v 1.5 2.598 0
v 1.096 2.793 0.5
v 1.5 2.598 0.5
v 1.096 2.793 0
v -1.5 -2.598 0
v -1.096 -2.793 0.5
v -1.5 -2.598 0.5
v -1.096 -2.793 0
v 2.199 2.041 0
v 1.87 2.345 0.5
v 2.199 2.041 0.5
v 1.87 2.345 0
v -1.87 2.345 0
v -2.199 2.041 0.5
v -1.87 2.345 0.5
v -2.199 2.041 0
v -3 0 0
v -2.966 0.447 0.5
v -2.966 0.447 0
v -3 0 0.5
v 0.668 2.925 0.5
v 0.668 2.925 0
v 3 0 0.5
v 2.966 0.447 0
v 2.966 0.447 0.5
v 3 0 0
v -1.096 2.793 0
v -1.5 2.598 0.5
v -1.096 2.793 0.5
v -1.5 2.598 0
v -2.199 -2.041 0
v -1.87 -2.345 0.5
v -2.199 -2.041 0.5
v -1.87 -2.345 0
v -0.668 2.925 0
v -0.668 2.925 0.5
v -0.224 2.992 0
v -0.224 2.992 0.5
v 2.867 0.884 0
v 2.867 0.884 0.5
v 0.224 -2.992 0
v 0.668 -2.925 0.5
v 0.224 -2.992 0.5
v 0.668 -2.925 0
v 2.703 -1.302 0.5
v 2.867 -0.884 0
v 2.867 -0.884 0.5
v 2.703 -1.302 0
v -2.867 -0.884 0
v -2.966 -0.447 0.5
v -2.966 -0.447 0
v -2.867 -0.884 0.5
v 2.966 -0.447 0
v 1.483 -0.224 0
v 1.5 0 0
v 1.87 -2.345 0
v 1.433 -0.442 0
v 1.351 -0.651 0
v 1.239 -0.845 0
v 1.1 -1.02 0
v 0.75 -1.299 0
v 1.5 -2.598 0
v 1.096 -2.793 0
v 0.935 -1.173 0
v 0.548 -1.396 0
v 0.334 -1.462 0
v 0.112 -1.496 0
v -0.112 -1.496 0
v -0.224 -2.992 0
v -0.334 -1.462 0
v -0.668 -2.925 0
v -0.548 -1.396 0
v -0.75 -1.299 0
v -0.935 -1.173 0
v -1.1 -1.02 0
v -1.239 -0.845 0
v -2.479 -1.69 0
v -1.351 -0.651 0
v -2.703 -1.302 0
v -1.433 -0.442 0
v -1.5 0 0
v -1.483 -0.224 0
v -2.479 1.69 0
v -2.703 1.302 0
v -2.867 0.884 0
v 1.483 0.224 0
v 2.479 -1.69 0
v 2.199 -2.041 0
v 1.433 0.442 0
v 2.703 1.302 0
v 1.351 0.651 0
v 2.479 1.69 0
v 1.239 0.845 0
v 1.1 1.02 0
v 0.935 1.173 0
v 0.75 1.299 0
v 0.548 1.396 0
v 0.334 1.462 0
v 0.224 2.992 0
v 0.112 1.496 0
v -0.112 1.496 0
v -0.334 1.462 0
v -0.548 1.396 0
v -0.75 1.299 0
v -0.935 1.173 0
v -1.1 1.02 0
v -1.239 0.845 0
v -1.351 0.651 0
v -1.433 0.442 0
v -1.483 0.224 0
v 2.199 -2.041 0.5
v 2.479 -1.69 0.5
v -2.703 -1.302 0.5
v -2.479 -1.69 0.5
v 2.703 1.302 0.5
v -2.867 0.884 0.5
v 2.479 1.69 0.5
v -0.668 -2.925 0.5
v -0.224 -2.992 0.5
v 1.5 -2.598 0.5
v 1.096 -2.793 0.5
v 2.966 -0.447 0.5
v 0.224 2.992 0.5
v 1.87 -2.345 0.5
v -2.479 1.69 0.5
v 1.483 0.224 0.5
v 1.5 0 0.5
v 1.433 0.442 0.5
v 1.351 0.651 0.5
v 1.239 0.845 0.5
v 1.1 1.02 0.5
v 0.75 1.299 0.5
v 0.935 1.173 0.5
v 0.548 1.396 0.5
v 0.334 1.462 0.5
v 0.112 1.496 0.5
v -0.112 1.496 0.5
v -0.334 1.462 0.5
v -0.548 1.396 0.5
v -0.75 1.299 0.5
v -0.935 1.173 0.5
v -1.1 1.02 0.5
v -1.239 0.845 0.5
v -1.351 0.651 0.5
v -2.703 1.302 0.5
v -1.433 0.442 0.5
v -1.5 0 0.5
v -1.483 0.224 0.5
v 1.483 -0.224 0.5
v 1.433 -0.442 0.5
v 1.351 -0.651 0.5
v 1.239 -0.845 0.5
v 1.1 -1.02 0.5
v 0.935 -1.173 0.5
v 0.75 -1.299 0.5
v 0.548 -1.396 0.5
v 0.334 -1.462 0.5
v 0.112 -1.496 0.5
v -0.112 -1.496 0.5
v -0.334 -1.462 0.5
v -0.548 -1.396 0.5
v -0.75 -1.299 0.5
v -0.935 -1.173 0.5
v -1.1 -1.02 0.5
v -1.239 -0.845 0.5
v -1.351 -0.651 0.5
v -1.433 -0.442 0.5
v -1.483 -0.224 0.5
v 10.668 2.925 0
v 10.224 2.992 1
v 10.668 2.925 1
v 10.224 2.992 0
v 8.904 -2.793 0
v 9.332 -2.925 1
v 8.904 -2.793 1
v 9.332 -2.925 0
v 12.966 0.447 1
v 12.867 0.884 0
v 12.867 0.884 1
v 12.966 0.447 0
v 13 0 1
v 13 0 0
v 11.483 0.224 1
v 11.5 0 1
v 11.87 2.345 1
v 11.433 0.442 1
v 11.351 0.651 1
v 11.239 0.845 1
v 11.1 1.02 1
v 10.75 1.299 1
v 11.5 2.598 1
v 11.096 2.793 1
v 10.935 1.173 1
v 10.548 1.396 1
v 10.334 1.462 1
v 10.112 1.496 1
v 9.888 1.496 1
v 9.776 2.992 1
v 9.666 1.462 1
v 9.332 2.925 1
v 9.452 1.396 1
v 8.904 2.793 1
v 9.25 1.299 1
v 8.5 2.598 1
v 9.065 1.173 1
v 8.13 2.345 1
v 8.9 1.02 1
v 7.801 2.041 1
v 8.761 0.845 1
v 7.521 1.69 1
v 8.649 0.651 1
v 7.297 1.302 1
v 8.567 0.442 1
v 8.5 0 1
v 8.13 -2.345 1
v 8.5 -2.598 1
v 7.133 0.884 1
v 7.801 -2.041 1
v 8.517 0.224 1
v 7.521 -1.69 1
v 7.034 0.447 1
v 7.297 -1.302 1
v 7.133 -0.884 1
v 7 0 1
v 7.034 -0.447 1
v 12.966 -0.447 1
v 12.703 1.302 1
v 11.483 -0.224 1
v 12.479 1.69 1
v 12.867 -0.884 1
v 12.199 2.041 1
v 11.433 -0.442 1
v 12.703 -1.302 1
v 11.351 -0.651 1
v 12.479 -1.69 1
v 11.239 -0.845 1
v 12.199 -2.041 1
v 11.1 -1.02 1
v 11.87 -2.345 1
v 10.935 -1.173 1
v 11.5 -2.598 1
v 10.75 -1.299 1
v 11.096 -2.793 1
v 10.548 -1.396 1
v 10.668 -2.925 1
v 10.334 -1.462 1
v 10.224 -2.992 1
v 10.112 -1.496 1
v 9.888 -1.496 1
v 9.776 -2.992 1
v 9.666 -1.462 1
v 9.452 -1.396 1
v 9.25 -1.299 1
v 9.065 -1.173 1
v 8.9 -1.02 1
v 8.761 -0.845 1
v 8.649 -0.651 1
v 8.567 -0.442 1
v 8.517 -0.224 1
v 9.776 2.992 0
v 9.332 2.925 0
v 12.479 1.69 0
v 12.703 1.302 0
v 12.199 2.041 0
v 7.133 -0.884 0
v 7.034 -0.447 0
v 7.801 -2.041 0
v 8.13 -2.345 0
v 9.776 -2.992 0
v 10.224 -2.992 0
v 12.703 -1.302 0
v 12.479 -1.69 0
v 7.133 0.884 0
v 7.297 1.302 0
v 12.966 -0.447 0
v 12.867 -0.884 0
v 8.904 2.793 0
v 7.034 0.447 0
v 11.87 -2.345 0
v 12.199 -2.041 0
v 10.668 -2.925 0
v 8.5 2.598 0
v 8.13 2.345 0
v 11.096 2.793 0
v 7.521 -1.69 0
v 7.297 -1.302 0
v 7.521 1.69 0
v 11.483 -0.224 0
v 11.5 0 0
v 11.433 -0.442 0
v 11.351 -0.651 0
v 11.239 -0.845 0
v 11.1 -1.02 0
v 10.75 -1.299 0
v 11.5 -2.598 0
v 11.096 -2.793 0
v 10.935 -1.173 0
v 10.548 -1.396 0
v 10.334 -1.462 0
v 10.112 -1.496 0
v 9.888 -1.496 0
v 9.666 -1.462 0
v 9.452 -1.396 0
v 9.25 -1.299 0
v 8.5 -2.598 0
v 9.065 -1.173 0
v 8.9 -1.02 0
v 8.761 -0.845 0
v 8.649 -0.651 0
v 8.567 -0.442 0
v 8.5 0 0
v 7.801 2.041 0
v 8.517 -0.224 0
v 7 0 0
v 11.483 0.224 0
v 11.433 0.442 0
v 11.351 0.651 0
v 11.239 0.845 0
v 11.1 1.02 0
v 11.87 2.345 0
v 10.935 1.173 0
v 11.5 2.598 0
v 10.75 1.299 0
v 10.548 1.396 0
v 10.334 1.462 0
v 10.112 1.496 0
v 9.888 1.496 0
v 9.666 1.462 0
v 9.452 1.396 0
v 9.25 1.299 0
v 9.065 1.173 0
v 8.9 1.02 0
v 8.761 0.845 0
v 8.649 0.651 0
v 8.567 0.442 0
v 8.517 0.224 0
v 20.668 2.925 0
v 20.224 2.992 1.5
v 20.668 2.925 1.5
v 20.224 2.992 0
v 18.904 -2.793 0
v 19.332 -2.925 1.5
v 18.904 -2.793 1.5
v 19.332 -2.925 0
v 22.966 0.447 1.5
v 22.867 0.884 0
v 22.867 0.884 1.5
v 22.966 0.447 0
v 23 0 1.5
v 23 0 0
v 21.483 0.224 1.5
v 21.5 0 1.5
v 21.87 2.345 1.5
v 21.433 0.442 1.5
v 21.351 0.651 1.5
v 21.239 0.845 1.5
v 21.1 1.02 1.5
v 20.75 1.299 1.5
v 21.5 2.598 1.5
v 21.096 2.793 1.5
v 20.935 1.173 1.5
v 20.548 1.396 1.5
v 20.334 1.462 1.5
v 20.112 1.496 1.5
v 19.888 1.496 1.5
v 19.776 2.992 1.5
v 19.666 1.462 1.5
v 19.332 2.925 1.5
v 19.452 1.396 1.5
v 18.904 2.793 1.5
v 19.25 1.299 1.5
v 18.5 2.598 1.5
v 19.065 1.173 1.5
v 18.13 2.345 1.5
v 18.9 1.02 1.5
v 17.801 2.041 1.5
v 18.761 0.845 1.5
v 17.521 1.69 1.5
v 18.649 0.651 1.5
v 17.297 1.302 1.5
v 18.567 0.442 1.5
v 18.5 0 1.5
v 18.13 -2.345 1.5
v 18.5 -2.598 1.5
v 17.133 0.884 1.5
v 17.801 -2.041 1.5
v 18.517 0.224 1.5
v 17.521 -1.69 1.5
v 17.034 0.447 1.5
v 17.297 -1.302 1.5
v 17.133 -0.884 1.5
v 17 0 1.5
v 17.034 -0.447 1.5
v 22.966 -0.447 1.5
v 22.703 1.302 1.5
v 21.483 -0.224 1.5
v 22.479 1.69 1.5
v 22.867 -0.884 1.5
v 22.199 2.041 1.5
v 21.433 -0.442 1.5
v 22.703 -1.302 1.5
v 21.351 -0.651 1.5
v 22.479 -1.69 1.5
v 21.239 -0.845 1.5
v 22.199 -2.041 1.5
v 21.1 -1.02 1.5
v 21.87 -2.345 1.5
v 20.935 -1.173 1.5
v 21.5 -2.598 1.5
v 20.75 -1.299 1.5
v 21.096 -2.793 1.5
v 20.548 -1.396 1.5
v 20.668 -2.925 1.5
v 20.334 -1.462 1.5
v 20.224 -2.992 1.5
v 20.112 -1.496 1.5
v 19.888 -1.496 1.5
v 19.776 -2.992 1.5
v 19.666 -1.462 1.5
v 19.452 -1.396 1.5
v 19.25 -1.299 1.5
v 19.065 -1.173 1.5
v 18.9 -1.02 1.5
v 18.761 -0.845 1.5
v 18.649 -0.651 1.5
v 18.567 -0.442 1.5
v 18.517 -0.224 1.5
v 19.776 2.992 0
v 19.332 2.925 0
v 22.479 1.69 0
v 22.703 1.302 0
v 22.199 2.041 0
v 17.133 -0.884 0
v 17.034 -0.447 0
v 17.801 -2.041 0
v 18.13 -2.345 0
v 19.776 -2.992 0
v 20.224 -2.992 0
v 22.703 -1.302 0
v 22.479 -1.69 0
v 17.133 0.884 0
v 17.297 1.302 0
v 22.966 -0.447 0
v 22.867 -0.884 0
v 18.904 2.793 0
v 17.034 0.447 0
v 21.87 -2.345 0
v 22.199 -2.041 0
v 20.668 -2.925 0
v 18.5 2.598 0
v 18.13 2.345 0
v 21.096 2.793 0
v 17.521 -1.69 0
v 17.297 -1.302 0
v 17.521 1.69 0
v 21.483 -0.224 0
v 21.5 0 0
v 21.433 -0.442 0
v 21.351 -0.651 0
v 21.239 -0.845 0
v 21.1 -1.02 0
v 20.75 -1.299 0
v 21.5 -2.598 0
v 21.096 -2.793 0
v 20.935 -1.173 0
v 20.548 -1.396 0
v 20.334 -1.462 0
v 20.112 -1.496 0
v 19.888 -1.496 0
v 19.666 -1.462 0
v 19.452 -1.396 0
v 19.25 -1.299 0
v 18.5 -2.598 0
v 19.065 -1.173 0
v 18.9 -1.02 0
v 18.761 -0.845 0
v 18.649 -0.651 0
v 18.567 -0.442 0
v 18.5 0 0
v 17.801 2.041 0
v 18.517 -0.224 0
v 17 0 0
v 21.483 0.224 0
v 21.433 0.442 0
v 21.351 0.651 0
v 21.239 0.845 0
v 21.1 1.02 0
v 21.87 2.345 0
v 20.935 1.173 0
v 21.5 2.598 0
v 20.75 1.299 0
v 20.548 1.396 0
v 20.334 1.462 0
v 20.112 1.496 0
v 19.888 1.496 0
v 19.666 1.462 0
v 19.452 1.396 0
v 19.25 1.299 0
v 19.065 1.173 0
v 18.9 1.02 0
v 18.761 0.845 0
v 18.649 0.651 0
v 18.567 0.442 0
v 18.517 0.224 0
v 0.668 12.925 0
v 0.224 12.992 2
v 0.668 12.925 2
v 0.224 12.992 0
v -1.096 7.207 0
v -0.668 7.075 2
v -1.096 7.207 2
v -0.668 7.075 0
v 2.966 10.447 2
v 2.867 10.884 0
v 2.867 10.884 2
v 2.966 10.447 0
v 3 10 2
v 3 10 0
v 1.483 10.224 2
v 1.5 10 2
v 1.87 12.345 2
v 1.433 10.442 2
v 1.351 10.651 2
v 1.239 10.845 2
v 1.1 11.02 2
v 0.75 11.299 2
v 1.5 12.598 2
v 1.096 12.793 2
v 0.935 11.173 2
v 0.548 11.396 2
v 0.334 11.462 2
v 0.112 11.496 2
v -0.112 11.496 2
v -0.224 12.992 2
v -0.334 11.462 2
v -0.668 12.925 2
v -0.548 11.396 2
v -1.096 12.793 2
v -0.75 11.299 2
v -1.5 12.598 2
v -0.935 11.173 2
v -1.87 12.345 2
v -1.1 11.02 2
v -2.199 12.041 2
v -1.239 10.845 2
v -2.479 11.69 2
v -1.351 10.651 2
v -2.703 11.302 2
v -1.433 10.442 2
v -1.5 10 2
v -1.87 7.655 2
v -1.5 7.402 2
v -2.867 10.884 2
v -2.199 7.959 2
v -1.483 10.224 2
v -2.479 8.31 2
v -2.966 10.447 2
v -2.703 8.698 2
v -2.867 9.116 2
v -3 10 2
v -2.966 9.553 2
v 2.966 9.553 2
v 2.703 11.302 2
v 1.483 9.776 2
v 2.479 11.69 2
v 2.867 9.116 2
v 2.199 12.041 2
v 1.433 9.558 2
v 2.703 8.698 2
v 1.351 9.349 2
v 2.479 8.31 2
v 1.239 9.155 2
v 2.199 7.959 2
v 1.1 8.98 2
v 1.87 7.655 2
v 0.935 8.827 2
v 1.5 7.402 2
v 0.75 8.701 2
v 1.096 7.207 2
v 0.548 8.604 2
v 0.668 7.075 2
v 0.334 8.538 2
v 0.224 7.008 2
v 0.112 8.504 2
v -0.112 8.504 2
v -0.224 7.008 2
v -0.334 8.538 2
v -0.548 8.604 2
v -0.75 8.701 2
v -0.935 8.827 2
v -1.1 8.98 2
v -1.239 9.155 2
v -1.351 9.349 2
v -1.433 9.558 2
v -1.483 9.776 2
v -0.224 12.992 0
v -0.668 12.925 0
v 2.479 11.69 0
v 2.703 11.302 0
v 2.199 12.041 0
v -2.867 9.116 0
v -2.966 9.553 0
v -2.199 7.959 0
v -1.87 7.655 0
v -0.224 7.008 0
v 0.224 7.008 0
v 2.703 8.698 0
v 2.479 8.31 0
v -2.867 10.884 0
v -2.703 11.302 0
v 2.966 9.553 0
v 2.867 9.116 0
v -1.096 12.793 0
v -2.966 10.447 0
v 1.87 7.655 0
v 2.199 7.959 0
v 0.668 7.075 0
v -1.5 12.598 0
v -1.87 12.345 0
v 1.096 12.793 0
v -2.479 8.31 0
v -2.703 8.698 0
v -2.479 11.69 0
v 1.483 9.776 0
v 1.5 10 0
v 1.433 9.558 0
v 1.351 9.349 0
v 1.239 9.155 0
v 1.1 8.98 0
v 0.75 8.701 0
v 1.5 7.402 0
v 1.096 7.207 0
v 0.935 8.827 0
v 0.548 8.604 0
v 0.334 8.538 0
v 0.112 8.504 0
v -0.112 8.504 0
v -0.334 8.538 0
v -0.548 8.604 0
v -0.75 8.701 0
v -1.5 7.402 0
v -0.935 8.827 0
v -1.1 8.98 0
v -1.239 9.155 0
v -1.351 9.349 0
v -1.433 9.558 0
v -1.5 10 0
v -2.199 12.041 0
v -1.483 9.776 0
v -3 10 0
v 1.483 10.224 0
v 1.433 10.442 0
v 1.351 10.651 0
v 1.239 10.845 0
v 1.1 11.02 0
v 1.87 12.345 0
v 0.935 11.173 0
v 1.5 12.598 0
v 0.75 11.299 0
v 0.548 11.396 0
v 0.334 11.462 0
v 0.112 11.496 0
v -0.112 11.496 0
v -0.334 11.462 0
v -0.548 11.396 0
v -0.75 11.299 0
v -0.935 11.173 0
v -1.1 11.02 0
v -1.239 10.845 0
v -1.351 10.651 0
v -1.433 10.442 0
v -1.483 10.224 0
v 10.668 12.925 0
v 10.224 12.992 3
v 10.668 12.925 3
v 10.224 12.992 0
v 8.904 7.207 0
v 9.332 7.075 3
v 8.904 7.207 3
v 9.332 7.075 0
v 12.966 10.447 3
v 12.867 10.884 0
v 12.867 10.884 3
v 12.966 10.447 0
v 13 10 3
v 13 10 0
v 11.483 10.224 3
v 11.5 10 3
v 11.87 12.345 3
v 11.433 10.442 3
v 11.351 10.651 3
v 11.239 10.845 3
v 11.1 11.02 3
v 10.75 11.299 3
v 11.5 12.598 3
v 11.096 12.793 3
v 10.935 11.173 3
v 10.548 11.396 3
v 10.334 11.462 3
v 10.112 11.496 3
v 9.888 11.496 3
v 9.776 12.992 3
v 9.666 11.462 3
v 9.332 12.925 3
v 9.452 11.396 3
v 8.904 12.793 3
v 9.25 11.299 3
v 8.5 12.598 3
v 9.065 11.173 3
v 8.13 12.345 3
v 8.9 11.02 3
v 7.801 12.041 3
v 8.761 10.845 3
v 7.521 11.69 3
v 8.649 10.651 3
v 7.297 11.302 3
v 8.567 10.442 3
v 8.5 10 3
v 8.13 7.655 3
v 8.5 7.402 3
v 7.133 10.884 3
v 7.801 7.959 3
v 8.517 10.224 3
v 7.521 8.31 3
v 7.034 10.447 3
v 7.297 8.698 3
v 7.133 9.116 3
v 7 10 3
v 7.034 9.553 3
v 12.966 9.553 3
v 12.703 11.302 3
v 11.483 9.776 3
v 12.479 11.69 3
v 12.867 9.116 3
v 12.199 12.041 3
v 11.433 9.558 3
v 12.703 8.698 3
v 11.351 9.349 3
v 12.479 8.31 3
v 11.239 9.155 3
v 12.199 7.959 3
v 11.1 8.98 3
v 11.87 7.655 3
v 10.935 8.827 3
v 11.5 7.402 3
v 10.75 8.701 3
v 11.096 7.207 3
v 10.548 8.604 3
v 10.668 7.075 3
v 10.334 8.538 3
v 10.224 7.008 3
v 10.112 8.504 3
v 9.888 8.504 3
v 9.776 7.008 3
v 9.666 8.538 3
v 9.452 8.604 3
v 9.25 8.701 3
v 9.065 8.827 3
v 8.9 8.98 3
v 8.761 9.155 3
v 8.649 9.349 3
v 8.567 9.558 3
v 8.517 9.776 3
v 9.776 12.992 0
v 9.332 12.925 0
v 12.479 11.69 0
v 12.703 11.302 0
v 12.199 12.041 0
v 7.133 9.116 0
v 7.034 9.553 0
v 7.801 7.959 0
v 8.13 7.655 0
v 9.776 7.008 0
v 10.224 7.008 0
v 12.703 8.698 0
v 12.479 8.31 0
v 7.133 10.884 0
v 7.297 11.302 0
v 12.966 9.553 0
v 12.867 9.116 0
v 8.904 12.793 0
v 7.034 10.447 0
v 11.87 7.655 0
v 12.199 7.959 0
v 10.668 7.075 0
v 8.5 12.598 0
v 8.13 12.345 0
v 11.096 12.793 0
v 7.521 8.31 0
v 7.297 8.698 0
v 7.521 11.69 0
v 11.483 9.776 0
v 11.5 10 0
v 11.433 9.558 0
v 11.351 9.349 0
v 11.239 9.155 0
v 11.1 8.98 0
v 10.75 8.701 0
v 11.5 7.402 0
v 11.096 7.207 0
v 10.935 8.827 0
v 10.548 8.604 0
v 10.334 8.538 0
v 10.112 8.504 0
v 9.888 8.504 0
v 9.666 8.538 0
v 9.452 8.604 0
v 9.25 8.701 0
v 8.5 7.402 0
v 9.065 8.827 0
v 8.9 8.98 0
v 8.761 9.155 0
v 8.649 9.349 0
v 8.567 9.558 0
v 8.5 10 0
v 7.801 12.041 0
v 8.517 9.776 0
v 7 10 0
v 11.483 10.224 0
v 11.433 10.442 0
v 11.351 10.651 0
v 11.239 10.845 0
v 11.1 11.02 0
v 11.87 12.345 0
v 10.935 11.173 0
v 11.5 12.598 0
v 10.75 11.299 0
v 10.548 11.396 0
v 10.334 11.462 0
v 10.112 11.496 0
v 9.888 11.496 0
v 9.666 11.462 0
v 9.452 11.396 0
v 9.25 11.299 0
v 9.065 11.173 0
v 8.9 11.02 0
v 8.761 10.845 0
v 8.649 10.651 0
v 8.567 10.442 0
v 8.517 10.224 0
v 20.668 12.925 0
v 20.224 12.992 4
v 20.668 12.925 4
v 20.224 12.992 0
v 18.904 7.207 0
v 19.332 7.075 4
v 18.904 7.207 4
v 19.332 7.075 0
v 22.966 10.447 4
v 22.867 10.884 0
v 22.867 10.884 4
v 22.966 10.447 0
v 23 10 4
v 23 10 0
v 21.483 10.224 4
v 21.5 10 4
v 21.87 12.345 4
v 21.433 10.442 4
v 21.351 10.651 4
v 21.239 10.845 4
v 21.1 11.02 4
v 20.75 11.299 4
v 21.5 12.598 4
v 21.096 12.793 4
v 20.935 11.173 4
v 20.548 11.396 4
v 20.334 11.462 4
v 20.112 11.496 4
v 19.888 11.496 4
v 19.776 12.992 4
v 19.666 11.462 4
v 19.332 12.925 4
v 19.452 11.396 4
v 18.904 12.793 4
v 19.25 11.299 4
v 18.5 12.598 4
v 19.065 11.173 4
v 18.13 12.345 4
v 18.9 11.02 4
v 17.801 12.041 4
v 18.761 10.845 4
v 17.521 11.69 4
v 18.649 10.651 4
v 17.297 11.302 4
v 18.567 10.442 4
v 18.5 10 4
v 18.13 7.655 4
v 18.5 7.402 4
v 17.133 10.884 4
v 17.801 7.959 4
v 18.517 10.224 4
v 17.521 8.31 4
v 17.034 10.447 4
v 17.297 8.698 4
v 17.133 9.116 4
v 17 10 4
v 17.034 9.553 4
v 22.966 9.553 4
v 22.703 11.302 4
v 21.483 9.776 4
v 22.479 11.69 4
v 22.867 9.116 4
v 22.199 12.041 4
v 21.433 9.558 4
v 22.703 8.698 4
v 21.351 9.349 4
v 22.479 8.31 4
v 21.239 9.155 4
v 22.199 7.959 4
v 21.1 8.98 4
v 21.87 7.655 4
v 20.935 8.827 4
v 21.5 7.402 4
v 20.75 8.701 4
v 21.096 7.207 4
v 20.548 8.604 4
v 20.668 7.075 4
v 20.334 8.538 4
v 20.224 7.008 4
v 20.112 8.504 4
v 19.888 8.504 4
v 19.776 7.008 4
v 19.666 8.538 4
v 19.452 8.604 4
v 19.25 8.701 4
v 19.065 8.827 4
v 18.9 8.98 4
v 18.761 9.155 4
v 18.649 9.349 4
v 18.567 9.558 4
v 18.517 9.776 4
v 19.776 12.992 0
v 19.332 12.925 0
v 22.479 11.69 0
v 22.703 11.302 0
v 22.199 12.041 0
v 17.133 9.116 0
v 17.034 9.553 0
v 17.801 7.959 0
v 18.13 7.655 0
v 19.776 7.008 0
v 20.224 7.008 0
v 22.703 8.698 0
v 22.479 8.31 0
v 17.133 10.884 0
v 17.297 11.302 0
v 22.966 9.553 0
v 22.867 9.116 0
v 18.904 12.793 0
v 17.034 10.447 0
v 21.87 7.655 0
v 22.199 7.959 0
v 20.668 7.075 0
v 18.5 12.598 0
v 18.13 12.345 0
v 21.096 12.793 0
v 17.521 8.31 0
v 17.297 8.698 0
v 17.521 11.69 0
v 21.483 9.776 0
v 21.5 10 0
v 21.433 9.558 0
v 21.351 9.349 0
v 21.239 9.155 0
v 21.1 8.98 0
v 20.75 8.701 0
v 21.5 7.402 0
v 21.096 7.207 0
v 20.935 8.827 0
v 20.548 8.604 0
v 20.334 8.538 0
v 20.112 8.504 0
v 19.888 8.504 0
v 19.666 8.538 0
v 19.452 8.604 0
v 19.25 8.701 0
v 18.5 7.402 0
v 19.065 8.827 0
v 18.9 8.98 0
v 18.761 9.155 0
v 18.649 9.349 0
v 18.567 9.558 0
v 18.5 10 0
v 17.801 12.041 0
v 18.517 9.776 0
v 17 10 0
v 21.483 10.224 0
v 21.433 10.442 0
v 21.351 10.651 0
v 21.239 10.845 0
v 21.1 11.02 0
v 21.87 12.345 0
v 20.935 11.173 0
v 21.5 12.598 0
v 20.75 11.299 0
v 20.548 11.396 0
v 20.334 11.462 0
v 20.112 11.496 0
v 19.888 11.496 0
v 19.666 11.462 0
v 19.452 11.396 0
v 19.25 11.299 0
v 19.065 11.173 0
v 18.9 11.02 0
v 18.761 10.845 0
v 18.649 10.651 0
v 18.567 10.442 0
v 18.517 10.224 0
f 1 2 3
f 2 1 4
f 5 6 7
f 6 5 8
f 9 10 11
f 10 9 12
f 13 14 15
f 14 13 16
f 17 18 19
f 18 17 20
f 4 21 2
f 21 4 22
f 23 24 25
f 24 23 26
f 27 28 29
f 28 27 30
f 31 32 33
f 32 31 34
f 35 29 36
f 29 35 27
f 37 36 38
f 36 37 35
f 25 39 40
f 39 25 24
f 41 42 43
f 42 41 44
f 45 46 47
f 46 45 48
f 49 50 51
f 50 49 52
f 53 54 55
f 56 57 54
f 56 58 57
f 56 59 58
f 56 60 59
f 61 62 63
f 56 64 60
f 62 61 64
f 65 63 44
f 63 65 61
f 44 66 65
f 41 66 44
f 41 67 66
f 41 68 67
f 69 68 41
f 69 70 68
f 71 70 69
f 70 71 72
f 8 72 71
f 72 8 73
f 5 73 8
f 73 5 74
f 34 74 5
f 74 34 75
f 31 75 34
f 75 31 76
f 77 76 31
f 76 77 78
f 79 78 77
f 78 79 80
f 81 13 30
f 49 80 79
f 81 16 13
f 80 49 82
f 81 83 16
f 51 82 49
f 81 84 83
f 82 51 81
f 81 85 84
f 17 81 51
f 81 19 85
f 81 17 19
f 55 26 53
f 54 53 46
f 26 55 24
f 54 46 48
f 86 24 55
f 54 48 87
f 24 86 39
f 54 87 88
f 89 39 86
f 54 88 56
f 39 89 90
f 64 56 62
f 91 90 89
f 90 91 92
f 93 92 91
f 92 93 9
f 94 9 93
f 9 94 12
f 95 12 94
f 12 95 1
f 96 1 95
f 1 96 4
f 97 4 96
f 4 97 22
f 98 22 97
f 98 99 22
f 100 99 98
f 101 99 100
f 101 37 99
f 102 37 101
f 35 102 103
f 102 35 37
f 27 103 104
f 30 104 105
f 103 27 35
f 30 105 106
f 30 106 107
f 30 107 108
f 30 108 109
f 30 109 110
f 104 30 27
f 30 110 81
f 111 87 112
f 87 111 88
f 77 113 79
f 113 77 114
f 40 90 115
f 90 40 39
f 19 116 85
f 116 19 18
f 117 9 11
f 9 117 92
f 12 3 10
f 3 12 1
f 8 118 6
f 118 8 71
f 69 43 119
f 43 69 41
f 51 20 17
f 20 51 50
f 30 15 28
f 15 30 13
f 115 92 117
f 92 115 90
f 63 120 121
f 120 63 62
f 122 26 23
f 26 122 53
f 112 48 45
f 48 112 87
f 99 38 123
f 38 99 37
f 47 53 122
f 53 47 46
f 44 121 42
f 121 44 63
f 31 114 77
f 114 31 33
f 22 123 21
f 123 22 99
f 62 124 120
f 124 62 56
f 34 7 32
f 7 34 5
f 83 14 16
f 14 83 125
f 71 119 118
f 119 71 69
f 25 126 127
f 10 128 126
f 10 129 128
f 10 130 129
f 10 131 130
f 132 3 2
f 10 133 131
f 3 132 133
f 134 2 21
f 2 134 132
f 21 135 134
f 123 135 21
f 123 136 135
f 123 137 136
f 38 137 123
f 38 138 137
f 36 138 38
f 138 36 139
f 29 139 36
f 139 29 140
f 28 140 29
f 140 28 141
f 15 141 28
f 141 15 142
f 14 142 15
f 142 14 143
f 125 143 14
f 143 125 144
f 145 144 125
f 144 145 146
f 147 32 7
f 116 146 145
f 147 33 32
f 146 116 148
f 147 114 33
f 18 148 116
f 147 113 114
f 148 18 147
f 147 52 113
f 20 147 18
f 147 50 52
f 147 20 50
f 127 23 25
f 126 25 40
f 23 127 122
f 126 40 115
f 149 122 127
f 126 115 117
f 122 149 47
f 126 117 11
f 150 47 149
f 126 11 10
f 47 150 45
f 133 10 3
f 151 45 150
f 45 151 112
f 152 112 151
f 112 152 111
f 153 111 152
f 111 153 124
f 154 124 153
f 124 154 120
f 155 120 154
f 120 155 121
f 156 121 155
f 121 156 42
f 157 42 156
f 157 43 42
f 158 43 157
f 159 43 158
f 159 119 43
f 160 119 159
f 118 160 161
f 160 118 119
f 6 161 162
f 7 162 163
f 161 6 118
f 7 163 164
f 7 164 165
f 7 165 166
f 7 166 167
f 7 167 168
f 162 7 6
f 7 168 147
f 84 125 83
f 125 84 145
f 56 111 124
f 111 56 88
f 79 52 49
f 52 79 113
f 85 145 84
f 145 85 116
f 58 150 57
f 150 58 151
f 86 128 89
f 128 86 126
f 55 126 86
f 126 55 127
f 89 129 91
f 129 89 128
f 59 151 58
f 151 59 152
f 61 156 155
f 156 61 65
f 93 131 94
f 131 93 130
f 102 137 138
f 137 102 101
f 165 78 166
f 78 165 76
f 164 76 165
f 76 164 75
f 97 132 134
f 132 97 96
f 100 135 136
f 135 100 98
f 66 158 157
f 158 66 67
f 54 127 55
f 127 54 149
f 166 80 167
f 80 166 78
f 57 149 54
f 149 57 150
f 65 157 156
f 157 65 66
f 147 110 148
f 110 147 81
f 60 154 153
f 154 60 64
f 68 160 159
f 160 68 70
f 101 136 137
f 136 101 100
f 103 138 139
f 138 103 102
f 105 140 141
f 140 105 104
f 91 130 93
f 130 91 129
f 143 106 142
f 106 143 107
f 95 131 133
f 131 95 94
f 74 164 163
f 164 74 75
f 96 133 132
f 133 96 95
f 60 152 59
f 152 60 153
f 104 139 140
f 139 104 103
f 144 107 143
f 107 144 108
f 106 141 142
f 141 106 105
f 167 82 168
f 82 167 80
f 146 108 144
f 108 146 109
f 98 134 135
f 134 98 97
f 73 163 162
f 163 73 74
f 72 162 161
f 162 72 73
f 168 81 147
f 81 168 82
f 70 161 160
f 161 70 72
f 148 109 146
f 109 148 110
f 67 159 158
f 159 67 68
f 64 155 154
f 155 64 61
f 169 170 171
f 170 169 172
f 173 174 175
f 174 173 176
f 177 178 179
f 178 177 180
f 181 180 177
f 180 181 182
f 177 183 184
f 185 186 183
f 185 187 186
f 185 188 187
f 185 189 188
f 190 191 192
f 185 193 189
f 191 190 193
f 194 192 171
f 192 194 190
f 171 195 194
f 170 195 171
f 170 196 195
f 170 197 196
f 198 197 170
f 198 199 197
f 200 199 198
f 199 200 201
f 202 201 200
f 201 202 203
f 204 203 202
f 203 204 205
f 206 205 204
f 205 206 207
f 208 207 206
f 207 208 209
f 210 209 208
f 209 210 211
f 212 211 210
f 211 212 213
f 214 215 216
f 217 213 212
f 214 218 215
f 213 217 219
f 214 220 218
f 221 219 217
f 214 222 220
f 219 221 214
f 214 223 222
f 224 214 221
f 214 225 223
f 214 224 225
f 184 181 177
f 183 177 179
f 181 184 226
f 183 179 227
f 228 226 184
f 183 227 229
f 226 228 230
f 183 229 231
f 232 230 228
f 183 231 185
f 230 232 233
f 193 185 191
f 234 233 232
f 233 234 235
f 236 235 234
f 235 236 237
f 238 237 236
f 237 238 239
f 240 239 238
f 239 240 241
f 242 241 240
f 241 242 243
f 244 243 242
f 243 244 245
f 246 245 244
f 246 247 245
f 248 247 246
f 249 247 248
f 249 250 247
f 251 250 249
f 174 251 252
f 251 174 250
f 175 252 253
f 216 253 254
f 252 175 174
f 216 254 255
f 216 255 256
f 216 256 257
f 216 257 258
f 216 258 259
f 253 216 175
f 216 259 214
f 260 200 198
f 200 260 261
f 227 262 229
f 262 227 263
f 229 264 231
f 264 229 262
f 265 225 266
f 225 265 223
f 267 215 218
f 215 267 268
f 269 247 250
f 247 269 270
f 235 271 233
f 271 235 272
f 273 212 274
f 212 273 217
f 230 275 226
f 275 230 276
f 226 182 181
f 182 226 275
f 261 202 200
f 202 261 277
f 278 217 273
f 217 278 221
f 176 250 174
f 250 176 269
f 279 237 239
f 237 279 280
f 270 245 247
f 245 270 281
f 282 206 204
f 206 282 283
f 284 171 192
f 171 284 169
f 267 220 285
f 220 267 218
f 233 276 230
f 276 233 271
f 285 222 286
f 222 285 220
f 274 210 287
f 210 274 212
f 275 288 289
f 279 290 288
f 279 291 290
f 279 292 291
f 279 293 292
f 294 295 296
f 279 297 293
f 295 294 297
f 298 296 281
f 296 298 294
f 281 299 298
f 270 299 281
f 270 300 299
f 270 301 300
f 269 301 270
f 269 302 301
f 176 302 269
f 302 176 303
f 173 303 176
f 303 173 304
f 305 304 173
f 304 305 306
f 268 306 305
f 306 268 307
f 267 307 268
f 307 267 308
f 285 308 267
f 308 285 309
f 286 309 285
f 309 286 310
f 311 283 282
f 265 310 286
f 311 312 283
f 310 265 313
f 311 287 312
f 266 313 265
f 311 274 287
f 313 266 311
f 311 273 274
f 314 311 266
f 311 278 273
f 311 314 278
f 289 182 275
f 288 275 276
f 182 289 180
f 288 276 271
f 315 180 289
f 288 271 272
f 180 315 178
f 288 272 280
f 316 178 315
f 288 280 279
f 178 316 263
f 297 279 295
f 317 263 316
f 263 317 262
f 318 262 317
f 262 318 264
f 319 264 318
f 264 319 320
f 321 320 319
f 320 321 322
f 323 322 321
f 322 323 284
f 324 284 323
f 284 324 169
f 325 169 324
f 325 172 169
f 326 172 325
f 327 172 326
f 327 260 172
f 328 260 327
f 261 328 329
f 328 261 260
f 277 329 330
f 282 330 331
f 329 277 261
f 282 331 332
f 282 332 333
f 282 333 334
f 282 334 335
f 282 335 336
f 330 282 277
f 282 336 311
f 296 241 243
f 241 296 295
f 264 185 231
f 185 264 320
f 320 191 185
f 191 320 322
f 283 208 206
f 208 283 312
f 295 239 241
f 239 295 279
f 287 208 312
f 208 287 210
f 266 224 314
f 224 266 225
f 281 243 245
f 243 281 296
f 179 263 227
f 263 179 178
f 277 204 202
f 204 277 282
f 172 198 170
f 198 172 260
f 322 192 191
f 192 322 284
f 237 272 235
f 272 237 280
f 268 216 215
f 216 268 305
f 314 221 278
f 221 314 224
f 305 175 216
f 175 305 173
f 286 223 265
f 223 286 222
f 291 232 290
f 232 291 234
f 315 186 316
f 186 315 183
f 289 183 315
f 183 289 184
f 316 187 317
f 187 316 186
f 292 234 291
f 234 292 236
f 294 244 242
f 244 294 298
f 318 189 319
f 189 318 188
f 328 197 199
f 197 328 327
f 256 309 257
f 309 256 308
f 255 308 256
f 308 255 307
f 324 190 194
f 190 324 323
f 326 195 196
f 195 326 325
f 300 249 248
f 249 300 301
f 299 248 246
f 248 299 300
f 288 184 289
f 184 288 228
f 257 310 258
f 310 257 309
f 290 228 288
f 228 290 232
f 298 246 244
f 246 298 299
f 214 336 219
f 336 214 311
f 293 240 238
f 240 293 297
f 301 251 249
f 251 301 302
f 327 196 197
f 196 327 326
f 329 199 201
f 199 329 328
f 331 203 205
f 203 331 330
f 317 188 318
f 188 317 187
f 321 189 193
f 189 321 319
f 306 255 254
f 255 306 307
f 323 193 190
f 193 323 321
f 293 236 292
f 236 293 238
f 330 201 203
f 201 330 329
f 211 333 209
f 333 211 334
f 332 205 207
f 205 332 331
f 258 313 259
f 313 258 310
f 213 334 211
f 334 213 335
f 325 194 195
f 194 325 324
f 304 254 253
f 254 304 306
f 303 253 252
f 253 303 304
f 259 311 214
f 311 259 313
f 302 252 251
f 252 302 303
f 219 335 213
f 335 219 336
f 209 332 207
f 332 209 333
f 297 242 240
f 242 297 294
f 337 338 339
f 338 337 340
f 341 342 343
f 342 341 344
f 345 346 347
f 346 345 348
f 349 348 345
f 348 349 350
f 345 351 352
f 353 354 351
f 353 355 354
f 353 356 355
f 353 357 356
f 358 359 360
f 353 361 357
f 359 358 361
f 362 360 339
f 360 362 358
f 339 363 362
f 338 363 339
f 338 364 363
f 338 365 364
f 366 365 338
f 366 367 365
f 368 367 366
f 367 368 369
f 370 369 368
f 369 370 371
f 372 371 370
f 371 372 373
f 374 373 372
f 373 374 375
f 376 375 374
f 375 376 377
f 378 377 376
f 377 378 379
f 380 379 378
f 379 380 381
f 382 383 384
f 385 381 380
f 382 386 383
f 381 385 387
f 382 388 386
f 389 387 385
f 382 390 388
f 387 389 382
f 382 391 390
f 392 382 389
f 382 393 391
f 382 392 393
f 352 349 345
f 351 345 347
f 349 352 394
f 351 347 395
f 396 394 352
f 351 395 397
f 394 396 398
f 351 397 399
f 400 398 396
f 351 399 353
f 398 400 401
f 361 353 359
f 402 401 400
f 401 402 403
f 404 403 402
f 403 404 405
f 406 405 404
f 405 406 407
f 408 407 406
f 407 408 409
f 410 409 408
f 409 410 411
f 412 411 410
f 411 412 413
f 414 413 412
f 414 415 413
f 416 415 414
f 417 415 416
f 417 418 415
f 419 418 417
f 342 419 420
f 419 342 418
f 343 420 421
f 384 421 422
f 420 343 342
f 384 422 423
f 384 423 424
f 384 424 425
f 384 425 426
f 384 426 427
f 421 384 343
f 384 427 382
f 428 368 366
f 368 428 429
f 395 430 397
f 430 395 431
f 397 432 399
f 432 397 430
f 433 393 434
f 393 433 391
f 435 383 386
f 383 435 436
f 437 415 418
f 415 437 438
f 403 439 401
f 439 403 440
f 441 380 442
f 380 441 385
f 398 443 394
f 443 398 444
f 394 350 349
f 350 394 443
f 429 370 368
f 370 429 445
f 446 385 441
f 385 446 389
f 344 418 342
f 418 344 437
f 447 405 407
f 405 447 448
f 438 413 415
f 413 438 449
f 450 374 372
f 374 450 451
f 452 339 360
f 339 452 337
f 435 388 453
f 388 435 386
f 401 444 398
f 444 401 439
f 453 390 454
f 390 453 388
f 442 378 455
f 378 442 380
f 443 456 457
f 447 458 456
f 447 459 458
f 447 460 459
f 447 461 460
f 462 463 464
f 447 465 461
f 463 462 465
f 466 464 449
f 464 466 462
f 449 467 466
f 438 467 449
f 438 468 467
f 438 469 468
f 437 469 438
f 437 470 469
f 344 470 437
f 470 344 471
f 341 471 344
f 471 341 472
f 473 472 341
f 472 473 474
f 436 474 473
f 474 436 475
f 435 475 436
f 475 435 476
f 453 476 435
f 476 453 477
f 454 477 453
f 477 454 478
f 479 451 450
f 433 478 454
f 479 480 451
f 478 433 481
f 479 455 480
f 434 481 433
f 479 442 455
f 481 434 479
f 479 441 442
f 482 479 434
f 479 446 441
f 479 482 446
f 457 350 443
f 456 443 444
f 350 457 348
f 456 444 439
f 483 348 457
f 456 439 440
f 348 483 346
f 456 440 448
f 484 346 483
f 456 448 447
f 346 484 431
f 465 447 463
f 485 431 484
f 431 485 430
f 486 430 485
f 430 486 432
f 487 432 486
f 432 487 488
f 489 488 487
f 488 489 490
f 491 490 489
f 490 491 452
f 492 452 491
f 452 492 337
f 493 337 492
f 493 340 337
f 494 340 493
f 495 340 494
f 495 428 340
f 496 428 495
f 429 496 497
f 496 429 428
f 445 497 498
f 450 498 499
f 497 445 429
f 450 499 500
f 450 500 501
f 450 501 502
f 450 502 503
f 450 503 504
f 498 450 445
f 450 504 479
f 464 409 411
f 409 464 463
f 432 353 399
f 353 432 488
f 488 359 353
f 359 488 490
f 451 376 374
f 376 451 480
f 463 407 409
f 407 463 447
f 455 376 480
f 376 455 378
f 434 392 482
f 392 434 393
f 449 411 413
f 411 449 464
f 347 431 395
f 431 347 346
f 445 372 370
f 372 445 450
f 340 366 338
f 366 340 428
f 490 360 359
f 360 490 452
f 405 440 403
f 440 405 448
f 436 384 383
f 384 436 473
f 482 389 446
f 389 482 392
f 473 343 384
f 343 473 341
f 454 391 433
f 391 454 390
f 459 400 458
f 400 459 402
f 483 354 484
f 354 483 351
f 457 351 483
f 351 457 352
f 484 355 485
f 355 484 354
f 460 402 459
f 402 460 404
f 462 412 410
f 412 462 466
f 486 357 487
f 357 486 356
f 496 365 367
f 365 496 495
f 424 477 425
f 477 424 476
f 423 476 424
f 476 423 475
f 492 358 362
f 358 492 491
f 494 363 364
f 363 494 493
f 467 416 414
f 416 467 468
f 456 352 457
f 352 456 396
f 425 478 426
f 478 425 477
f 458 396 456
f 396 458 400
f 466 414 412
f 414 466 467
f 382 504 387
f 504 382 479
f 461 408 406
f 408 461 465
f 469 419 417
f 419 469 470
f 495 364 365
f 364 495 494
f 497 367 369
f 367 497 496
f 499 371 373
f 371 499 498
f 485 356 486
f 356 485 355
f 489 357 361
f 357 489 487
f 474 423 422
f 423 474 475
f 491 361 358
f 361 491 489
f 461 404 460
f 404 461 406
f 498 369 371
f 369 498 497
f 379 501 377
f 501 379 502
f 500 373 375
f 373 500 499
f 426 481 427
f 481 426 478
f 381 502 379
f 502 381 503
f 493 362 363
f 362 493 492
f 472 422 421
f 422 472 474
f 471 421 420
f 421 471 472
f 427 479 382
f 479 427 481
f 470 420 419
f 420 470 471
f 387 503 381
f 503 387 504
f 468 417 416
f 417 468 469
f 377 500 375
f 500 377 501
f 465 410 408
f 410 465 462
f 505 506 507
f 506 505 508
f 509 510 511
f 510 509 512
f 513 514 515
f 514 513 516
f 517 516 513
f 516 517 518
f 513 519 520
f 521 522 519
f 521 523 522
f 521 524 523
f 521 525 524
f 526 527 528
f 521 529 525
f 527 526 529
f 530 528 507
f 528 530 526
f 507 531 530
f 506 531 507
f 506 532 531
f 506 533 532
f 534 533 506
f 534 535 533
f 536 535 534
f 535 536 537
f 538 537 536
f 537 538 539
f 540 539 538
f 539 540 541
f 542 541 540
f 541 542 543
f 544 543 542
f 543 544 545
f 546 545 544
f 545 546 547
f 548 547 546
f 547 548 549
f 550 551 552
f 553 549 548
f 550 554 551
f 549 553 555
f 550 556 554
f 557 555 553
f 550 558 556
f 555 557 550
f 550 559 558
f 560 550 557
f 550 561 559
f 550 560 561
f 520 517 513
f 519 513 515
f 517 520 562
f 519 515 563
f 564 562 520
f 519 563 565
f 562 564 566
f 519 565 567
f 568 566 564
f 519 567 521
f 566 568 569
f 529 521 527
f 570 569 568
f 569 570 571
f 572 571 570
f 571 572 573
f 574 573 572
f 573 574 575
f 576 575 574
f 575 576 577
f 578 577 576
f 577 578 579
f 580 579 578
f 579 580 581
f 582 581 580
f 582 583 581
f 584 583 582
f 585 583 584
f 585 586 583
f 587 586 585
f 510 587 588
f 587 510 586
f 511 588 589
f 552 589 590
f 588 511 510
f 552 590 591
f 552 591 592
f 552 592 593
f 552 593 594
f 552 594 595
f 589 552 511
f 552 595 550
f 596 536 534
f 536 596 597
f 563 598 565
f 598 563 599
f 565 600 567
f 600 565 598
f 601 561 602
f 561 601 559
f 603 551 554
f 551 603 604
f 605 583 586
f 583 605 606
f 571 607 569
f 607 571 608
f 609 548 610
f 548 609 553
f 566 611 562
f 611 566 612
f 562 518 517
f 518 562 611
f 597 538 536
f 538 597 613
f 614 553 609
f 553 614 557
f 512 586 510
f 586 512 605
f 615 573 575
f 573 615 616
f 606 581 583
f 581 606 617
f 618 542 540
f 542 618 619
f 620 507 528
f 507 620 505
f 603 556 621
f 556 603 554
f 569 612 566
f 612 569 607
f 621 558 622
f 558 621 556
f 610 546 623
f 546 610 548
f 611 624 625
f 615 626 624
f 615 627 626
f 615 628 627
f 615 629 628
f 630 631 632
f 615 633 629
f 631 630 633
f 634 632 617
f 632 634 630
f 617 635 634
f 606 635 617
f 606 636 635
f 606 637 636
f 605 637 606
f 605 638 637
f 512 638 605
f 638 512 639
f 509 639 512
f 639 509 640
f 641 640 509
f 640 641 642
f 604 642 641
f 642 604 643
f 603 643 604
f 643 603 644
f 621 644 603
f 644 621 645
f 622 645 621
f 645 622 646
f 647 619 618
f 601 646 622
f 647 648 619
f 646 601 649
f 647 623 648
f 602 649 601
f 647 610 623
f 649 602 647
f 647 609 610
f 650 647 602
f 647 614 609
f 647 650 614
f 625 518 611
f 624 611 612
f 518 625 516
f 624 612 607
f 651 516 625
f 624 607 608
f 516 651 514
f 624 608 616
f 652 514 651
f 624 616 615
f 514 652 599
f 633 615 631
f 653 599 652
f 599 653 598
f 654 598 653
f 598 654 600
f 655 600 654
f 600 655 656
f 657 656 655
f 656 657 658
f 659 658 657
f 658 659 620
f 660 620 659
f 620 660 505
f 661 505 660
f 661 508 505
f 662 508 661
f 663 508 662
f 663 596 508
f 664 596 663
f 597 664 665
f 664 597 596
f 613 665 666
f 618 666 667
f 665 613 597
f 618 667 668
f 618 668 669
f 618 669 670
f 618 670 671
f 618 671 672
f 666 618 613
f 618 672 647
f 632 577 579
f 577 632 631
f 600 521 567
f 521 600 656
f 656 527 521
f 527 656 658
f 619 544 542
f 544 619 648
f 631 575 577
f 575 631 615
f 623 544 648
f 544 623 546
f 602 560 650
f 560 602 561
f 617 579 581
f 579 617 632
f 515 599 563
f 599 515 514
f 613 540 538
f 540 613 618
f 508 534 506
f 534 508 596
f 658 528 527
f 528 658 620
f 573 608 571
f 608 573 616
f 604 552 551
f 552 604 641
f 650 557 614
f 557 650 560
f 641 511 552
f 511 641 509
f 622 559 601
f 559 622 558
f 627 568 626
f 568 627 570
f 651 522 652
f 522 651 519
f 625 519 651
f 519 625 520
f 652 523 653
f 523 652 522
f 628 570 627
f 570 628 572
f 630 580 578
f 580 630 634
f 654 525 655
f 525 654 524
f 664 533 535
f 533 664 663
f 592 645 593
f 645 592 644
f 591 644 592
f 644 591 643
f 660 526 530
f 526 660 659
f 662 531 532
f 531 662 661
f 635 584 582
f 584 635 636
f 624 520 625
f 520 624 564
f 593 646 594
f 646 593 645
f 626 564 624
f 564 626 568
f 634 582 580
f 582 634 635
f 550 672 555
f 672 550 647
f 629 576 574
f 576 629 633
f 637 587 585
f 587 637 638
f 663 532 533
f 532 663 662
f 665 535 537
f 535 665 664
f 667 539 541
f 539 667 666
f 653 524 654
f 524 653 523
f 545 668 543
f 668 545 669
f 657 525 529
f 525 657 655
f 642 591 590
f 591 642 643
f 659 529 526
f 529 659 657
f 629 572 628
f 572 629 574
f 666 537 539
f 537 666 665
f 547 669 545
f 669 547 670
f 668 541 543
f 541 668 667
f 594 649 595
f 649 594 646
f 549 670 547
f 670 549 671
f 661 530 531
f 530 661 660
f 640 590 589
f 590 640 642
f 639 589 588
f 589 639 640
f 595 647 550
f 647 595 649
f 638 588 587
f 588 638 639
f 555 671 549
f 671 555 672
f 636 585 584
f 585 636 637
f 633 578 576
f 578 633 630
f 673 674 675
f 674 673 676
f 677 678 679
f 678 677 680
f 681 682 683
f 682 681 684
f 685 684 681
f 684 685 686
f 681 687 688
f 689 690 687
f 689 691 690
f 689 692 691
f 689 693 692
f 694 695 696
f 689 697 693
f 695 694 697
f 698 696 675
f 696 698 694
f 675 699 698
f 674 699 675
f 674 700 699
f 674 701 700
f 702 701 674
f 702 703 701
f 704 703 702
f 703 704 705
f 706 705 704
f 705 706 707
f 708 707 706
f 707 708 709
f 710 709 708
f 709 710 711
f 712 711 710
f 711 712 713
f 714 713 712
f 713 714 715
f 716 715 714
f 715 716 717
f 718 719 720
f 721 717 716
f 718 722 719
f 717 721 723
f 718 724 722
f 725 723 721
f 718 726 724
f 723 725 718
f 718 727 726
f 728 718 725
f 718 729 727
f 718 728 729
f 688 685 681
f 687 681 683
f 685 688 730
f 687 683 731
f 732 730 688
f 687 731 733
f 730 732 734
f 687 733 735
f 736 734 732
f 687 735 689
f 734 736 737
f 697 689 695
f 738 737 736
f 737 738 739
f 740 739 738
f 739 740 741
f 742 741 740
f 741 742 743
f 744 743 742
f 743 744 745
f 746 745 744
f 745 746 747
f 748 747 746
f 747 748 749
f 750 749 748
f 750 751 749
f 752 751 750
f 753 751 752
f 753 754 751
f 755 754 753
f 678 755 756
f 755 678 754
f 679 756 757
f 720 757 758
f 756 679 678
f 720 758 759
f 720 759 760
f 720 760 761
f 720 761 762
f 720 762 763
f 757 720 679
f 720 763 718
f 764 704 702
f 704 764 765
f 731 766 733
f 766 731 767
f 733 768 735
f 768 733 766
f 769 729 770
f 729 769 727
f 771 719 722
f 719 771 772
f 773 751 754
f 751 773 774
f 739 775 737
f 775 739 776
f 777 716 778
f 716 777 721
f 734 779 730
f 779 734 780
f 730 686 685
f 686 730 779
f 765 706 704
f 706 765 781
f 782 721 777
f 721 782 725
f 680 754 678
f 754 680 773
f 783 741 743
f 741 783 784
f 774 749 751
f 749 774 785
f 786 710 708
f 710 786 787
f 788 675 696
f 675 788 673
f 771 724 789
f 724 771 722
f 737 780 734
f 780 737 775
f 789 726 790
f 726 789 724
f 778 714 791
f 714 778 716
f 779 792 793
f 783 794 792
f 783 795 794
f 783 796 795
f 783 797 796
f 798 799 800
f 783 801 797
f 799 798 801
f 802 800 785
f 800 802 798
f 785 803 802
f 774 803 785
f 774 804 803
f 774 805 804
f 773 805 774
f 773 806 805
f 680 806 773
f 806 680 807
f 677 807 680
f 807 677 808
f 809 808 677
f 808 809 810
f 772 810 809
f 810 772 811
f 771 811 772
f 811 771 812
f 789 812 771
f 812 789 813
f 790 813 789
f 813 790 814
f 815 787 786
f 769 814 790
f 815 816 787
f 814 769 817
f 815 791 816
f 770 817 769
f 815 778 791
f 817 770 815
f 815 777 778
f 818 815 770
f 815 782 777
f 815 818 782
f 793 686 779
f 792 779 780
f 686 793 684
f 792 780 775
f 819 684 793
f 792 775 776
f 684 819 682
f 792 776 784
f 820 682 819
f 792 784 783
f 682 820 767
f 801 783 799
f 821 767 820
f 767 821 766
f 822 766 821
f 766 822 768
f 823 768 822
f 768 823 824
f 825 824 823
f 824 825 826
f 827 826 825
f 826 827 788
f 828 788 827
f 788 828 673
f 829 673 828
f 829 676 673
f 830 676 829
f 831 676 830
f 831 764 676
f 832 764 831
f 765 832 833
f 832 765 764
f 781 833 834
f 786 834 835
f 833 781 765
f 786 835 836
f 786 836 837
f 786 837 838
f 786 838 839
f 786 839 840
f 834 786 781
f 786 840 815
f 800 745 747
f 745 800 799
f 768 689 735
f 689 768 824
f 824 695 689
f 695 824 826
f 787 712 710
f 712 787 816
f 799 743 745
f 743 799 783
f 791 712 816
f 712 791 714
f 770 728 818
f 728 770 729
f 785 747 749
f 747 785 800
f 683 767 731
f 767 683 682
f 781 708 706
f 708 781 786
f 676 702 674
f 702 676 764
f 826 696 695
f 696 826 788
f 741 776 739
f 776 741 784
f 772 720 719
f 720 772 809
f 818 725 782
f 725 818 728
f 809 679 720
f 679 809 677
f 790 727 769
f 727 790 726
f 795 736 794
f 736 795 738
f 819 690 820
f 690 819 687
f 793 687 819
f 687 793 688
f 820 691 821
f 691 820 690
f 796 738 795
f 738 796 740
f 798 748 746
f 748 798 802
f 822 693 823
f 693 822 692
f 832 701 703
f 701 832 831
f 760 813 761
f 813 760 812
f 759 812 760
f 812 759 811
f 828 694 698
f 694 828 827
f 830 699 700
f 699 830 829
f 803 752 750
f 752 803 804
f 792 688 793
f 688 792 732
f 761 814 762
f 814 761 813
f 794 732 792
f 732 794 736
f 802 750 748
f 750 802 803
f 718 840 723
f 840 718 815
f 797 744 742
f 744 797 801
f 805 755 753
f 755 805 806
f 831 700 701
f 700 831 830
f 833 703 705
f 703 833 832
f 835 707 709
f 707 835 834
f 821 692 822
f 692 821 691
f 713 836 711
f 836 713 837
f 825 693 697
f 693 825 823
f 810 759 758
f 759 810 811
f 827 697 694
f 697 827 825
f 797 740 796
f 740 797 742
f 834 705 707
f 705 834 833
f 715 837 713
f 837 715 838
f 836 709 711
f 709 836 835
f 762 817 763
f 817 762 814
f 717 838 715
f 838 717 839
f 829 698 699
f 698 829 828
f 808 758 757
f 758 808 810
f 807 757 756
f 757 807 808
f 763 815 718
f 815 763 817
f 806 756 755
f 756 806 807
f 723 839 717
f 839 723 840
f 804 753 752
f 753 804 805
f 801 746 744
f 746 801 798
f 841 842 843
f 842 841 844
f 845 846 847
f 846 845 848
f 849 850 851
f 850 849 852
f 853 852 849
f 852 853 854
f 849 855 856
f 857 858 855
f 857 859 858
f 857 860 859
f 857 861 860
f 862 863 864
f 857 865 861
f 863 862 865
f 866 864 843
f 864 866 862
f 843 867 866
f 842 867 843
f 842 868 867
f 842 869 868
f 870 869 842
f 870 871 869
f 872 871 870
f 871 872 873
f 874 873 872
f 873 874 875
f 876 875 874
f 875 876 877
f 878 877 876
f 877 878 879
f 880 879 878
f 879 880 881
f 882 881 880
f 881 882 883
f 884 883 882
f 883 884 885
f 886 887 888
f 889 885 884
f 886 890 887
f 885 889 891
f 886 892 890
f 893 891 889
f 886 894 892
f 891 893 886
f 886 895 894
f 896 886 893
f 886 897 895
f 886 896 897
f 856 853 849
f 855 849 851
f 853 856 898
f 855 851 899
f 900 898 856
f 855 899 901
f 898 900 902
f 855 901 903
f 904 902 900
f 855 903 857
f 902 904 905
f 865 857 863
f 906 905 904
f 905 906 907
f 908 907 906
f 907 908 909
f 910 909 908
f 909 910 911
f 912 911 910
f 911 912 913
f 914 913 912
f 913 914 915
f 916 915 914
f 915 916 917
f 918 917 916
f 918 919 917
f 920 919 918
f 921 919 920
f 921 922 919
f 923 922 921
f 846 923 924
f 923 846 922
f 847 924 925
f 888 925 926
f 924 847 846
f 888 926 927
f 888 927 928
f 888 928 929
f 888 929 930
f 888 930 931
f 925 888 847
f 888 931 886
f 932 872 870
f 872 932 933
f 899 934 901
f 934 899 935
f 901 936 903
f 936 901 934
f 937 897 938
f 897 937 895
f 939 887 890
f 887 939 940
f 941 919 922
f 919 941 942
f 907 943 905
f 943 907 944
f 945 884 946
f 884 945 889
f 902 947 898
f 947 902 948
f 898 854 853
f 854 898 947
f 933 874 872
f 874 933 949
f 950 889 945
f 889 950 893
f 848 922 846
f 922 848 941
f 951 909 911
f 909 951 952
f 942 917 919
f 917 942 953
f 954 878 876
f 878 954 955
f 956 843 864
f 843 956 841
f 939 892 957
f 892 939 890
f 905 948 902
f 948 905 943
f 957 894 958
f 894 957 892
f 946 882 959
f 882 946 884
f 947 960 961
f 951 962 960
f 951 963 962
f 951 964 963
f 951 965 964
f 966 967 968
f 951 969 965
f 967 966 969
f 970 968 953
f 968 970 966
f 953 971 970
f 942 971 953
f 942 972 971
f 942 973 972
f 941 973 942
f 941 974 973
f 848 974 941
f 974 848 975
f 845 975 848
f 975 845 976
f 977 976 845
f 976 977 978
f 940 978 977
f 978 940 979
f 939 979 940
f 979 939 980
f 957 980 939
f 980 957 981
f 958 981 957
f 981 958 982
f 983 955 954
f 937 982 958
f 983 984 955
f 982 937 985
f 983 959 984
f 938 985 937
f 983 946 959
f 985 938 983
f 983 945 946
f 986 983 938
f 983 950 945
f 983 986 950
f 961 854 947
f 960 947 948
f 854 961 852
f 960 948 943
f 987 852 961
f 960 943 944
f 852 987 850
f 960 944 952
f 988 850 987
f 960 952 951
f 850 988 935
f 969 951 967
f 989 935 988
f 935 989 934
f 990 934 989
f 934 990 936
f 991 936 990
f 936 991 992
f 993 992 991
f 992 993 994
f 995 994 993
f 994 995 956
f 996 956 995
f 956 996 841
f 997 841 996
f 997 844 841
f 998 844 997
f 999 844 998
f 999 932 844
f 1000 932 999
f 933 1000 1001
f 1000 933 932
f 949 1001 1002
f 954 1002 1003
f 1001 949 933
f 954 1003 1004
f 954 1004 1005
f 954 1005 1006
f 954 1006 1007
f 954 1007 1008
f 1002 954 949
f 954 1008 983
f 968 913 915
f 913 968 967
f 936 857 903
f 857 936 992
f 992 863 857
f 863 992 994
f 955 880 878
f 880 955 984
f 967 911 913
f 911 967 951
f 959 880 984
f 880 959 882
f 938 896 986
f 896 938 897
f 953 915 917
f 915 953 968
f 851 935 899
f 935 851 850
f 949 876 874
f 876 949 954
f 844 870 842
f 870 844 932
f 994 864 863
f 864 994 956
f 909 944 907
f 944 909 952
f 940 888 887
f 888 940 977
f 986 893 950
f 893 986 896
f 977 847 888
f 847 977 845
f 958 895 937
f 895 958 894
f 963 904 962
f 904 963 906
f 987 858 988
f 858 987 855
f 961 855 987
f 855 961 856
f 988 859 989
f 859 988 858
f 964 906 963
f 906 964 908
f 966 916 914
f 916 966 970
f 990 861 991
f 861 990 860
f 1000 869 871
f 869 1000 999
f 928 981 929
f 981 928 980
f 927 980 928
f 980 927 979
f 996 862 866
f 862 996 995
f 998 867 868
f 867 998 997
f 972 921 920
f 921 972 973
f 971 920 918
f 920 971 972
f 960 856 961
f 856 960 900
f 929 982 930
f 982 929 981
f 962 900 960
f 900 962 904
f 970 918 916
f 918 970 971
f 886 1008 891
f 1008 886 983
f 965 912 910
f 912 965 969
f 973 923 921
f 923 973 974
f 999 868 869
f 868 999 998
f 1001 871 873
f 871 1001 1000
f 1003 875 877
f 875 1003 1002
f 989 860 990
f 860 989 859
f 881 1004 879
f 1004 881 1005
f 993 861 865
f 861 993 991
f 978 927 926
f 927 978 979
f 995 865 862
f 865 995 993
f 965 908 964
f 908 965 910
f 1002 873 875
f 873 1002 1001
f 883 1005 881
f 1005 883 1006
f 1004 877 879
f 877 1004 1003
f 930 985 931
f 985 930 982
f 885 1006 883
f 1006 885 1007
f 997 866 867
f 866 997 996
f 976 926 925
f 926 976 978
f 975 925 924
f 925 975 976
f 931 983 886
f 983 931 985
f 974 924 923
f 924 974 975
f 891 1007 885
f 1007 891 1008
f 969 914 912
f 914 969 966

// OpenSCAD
/* Shims for adjusting roll center (RC) or any other distance

Like Yokomo ZCR-A3614/ZCR-A3615/ZCR-A3615G (2x6x1.5)

*/

$fn=42;

translate([0, 0, 0])
difference()
{
	cylinder(d=6.0, h=0.5, center=false);
	cylinder(d=3.0, h=0.5, center=false);
}

translate([10, 0, 0])
difference()
{
	cylinder(d=6.0, h=1.0, center=false);
	cylinder(d=3.0, h=1.0, center=false);
}

translate([20, 0, 0])
difference()
{
	cylinder(d=6.0, h=1.5, center=false);
	cylinder(d=3.0, h=1.5, center=false);
}

translate([00, 10, 0])
difference()
{
	cylinder(d=6.0, h=2.0, center=false);
	cylinder(d=3.0, h=2.0, center=false);
}

translate([10, 10, 0])
difference()
{
	cylinder(d=6.0, h=3.0, center=false);
	cylinder(d=3.0, h=3.0, center=false);
}

translate([20, 10, 0])
difference()
{
	cylinder(d=6.0, h=4.0, center=false);
	cylinder(d=3.0, h=4.0, center=false);
}
